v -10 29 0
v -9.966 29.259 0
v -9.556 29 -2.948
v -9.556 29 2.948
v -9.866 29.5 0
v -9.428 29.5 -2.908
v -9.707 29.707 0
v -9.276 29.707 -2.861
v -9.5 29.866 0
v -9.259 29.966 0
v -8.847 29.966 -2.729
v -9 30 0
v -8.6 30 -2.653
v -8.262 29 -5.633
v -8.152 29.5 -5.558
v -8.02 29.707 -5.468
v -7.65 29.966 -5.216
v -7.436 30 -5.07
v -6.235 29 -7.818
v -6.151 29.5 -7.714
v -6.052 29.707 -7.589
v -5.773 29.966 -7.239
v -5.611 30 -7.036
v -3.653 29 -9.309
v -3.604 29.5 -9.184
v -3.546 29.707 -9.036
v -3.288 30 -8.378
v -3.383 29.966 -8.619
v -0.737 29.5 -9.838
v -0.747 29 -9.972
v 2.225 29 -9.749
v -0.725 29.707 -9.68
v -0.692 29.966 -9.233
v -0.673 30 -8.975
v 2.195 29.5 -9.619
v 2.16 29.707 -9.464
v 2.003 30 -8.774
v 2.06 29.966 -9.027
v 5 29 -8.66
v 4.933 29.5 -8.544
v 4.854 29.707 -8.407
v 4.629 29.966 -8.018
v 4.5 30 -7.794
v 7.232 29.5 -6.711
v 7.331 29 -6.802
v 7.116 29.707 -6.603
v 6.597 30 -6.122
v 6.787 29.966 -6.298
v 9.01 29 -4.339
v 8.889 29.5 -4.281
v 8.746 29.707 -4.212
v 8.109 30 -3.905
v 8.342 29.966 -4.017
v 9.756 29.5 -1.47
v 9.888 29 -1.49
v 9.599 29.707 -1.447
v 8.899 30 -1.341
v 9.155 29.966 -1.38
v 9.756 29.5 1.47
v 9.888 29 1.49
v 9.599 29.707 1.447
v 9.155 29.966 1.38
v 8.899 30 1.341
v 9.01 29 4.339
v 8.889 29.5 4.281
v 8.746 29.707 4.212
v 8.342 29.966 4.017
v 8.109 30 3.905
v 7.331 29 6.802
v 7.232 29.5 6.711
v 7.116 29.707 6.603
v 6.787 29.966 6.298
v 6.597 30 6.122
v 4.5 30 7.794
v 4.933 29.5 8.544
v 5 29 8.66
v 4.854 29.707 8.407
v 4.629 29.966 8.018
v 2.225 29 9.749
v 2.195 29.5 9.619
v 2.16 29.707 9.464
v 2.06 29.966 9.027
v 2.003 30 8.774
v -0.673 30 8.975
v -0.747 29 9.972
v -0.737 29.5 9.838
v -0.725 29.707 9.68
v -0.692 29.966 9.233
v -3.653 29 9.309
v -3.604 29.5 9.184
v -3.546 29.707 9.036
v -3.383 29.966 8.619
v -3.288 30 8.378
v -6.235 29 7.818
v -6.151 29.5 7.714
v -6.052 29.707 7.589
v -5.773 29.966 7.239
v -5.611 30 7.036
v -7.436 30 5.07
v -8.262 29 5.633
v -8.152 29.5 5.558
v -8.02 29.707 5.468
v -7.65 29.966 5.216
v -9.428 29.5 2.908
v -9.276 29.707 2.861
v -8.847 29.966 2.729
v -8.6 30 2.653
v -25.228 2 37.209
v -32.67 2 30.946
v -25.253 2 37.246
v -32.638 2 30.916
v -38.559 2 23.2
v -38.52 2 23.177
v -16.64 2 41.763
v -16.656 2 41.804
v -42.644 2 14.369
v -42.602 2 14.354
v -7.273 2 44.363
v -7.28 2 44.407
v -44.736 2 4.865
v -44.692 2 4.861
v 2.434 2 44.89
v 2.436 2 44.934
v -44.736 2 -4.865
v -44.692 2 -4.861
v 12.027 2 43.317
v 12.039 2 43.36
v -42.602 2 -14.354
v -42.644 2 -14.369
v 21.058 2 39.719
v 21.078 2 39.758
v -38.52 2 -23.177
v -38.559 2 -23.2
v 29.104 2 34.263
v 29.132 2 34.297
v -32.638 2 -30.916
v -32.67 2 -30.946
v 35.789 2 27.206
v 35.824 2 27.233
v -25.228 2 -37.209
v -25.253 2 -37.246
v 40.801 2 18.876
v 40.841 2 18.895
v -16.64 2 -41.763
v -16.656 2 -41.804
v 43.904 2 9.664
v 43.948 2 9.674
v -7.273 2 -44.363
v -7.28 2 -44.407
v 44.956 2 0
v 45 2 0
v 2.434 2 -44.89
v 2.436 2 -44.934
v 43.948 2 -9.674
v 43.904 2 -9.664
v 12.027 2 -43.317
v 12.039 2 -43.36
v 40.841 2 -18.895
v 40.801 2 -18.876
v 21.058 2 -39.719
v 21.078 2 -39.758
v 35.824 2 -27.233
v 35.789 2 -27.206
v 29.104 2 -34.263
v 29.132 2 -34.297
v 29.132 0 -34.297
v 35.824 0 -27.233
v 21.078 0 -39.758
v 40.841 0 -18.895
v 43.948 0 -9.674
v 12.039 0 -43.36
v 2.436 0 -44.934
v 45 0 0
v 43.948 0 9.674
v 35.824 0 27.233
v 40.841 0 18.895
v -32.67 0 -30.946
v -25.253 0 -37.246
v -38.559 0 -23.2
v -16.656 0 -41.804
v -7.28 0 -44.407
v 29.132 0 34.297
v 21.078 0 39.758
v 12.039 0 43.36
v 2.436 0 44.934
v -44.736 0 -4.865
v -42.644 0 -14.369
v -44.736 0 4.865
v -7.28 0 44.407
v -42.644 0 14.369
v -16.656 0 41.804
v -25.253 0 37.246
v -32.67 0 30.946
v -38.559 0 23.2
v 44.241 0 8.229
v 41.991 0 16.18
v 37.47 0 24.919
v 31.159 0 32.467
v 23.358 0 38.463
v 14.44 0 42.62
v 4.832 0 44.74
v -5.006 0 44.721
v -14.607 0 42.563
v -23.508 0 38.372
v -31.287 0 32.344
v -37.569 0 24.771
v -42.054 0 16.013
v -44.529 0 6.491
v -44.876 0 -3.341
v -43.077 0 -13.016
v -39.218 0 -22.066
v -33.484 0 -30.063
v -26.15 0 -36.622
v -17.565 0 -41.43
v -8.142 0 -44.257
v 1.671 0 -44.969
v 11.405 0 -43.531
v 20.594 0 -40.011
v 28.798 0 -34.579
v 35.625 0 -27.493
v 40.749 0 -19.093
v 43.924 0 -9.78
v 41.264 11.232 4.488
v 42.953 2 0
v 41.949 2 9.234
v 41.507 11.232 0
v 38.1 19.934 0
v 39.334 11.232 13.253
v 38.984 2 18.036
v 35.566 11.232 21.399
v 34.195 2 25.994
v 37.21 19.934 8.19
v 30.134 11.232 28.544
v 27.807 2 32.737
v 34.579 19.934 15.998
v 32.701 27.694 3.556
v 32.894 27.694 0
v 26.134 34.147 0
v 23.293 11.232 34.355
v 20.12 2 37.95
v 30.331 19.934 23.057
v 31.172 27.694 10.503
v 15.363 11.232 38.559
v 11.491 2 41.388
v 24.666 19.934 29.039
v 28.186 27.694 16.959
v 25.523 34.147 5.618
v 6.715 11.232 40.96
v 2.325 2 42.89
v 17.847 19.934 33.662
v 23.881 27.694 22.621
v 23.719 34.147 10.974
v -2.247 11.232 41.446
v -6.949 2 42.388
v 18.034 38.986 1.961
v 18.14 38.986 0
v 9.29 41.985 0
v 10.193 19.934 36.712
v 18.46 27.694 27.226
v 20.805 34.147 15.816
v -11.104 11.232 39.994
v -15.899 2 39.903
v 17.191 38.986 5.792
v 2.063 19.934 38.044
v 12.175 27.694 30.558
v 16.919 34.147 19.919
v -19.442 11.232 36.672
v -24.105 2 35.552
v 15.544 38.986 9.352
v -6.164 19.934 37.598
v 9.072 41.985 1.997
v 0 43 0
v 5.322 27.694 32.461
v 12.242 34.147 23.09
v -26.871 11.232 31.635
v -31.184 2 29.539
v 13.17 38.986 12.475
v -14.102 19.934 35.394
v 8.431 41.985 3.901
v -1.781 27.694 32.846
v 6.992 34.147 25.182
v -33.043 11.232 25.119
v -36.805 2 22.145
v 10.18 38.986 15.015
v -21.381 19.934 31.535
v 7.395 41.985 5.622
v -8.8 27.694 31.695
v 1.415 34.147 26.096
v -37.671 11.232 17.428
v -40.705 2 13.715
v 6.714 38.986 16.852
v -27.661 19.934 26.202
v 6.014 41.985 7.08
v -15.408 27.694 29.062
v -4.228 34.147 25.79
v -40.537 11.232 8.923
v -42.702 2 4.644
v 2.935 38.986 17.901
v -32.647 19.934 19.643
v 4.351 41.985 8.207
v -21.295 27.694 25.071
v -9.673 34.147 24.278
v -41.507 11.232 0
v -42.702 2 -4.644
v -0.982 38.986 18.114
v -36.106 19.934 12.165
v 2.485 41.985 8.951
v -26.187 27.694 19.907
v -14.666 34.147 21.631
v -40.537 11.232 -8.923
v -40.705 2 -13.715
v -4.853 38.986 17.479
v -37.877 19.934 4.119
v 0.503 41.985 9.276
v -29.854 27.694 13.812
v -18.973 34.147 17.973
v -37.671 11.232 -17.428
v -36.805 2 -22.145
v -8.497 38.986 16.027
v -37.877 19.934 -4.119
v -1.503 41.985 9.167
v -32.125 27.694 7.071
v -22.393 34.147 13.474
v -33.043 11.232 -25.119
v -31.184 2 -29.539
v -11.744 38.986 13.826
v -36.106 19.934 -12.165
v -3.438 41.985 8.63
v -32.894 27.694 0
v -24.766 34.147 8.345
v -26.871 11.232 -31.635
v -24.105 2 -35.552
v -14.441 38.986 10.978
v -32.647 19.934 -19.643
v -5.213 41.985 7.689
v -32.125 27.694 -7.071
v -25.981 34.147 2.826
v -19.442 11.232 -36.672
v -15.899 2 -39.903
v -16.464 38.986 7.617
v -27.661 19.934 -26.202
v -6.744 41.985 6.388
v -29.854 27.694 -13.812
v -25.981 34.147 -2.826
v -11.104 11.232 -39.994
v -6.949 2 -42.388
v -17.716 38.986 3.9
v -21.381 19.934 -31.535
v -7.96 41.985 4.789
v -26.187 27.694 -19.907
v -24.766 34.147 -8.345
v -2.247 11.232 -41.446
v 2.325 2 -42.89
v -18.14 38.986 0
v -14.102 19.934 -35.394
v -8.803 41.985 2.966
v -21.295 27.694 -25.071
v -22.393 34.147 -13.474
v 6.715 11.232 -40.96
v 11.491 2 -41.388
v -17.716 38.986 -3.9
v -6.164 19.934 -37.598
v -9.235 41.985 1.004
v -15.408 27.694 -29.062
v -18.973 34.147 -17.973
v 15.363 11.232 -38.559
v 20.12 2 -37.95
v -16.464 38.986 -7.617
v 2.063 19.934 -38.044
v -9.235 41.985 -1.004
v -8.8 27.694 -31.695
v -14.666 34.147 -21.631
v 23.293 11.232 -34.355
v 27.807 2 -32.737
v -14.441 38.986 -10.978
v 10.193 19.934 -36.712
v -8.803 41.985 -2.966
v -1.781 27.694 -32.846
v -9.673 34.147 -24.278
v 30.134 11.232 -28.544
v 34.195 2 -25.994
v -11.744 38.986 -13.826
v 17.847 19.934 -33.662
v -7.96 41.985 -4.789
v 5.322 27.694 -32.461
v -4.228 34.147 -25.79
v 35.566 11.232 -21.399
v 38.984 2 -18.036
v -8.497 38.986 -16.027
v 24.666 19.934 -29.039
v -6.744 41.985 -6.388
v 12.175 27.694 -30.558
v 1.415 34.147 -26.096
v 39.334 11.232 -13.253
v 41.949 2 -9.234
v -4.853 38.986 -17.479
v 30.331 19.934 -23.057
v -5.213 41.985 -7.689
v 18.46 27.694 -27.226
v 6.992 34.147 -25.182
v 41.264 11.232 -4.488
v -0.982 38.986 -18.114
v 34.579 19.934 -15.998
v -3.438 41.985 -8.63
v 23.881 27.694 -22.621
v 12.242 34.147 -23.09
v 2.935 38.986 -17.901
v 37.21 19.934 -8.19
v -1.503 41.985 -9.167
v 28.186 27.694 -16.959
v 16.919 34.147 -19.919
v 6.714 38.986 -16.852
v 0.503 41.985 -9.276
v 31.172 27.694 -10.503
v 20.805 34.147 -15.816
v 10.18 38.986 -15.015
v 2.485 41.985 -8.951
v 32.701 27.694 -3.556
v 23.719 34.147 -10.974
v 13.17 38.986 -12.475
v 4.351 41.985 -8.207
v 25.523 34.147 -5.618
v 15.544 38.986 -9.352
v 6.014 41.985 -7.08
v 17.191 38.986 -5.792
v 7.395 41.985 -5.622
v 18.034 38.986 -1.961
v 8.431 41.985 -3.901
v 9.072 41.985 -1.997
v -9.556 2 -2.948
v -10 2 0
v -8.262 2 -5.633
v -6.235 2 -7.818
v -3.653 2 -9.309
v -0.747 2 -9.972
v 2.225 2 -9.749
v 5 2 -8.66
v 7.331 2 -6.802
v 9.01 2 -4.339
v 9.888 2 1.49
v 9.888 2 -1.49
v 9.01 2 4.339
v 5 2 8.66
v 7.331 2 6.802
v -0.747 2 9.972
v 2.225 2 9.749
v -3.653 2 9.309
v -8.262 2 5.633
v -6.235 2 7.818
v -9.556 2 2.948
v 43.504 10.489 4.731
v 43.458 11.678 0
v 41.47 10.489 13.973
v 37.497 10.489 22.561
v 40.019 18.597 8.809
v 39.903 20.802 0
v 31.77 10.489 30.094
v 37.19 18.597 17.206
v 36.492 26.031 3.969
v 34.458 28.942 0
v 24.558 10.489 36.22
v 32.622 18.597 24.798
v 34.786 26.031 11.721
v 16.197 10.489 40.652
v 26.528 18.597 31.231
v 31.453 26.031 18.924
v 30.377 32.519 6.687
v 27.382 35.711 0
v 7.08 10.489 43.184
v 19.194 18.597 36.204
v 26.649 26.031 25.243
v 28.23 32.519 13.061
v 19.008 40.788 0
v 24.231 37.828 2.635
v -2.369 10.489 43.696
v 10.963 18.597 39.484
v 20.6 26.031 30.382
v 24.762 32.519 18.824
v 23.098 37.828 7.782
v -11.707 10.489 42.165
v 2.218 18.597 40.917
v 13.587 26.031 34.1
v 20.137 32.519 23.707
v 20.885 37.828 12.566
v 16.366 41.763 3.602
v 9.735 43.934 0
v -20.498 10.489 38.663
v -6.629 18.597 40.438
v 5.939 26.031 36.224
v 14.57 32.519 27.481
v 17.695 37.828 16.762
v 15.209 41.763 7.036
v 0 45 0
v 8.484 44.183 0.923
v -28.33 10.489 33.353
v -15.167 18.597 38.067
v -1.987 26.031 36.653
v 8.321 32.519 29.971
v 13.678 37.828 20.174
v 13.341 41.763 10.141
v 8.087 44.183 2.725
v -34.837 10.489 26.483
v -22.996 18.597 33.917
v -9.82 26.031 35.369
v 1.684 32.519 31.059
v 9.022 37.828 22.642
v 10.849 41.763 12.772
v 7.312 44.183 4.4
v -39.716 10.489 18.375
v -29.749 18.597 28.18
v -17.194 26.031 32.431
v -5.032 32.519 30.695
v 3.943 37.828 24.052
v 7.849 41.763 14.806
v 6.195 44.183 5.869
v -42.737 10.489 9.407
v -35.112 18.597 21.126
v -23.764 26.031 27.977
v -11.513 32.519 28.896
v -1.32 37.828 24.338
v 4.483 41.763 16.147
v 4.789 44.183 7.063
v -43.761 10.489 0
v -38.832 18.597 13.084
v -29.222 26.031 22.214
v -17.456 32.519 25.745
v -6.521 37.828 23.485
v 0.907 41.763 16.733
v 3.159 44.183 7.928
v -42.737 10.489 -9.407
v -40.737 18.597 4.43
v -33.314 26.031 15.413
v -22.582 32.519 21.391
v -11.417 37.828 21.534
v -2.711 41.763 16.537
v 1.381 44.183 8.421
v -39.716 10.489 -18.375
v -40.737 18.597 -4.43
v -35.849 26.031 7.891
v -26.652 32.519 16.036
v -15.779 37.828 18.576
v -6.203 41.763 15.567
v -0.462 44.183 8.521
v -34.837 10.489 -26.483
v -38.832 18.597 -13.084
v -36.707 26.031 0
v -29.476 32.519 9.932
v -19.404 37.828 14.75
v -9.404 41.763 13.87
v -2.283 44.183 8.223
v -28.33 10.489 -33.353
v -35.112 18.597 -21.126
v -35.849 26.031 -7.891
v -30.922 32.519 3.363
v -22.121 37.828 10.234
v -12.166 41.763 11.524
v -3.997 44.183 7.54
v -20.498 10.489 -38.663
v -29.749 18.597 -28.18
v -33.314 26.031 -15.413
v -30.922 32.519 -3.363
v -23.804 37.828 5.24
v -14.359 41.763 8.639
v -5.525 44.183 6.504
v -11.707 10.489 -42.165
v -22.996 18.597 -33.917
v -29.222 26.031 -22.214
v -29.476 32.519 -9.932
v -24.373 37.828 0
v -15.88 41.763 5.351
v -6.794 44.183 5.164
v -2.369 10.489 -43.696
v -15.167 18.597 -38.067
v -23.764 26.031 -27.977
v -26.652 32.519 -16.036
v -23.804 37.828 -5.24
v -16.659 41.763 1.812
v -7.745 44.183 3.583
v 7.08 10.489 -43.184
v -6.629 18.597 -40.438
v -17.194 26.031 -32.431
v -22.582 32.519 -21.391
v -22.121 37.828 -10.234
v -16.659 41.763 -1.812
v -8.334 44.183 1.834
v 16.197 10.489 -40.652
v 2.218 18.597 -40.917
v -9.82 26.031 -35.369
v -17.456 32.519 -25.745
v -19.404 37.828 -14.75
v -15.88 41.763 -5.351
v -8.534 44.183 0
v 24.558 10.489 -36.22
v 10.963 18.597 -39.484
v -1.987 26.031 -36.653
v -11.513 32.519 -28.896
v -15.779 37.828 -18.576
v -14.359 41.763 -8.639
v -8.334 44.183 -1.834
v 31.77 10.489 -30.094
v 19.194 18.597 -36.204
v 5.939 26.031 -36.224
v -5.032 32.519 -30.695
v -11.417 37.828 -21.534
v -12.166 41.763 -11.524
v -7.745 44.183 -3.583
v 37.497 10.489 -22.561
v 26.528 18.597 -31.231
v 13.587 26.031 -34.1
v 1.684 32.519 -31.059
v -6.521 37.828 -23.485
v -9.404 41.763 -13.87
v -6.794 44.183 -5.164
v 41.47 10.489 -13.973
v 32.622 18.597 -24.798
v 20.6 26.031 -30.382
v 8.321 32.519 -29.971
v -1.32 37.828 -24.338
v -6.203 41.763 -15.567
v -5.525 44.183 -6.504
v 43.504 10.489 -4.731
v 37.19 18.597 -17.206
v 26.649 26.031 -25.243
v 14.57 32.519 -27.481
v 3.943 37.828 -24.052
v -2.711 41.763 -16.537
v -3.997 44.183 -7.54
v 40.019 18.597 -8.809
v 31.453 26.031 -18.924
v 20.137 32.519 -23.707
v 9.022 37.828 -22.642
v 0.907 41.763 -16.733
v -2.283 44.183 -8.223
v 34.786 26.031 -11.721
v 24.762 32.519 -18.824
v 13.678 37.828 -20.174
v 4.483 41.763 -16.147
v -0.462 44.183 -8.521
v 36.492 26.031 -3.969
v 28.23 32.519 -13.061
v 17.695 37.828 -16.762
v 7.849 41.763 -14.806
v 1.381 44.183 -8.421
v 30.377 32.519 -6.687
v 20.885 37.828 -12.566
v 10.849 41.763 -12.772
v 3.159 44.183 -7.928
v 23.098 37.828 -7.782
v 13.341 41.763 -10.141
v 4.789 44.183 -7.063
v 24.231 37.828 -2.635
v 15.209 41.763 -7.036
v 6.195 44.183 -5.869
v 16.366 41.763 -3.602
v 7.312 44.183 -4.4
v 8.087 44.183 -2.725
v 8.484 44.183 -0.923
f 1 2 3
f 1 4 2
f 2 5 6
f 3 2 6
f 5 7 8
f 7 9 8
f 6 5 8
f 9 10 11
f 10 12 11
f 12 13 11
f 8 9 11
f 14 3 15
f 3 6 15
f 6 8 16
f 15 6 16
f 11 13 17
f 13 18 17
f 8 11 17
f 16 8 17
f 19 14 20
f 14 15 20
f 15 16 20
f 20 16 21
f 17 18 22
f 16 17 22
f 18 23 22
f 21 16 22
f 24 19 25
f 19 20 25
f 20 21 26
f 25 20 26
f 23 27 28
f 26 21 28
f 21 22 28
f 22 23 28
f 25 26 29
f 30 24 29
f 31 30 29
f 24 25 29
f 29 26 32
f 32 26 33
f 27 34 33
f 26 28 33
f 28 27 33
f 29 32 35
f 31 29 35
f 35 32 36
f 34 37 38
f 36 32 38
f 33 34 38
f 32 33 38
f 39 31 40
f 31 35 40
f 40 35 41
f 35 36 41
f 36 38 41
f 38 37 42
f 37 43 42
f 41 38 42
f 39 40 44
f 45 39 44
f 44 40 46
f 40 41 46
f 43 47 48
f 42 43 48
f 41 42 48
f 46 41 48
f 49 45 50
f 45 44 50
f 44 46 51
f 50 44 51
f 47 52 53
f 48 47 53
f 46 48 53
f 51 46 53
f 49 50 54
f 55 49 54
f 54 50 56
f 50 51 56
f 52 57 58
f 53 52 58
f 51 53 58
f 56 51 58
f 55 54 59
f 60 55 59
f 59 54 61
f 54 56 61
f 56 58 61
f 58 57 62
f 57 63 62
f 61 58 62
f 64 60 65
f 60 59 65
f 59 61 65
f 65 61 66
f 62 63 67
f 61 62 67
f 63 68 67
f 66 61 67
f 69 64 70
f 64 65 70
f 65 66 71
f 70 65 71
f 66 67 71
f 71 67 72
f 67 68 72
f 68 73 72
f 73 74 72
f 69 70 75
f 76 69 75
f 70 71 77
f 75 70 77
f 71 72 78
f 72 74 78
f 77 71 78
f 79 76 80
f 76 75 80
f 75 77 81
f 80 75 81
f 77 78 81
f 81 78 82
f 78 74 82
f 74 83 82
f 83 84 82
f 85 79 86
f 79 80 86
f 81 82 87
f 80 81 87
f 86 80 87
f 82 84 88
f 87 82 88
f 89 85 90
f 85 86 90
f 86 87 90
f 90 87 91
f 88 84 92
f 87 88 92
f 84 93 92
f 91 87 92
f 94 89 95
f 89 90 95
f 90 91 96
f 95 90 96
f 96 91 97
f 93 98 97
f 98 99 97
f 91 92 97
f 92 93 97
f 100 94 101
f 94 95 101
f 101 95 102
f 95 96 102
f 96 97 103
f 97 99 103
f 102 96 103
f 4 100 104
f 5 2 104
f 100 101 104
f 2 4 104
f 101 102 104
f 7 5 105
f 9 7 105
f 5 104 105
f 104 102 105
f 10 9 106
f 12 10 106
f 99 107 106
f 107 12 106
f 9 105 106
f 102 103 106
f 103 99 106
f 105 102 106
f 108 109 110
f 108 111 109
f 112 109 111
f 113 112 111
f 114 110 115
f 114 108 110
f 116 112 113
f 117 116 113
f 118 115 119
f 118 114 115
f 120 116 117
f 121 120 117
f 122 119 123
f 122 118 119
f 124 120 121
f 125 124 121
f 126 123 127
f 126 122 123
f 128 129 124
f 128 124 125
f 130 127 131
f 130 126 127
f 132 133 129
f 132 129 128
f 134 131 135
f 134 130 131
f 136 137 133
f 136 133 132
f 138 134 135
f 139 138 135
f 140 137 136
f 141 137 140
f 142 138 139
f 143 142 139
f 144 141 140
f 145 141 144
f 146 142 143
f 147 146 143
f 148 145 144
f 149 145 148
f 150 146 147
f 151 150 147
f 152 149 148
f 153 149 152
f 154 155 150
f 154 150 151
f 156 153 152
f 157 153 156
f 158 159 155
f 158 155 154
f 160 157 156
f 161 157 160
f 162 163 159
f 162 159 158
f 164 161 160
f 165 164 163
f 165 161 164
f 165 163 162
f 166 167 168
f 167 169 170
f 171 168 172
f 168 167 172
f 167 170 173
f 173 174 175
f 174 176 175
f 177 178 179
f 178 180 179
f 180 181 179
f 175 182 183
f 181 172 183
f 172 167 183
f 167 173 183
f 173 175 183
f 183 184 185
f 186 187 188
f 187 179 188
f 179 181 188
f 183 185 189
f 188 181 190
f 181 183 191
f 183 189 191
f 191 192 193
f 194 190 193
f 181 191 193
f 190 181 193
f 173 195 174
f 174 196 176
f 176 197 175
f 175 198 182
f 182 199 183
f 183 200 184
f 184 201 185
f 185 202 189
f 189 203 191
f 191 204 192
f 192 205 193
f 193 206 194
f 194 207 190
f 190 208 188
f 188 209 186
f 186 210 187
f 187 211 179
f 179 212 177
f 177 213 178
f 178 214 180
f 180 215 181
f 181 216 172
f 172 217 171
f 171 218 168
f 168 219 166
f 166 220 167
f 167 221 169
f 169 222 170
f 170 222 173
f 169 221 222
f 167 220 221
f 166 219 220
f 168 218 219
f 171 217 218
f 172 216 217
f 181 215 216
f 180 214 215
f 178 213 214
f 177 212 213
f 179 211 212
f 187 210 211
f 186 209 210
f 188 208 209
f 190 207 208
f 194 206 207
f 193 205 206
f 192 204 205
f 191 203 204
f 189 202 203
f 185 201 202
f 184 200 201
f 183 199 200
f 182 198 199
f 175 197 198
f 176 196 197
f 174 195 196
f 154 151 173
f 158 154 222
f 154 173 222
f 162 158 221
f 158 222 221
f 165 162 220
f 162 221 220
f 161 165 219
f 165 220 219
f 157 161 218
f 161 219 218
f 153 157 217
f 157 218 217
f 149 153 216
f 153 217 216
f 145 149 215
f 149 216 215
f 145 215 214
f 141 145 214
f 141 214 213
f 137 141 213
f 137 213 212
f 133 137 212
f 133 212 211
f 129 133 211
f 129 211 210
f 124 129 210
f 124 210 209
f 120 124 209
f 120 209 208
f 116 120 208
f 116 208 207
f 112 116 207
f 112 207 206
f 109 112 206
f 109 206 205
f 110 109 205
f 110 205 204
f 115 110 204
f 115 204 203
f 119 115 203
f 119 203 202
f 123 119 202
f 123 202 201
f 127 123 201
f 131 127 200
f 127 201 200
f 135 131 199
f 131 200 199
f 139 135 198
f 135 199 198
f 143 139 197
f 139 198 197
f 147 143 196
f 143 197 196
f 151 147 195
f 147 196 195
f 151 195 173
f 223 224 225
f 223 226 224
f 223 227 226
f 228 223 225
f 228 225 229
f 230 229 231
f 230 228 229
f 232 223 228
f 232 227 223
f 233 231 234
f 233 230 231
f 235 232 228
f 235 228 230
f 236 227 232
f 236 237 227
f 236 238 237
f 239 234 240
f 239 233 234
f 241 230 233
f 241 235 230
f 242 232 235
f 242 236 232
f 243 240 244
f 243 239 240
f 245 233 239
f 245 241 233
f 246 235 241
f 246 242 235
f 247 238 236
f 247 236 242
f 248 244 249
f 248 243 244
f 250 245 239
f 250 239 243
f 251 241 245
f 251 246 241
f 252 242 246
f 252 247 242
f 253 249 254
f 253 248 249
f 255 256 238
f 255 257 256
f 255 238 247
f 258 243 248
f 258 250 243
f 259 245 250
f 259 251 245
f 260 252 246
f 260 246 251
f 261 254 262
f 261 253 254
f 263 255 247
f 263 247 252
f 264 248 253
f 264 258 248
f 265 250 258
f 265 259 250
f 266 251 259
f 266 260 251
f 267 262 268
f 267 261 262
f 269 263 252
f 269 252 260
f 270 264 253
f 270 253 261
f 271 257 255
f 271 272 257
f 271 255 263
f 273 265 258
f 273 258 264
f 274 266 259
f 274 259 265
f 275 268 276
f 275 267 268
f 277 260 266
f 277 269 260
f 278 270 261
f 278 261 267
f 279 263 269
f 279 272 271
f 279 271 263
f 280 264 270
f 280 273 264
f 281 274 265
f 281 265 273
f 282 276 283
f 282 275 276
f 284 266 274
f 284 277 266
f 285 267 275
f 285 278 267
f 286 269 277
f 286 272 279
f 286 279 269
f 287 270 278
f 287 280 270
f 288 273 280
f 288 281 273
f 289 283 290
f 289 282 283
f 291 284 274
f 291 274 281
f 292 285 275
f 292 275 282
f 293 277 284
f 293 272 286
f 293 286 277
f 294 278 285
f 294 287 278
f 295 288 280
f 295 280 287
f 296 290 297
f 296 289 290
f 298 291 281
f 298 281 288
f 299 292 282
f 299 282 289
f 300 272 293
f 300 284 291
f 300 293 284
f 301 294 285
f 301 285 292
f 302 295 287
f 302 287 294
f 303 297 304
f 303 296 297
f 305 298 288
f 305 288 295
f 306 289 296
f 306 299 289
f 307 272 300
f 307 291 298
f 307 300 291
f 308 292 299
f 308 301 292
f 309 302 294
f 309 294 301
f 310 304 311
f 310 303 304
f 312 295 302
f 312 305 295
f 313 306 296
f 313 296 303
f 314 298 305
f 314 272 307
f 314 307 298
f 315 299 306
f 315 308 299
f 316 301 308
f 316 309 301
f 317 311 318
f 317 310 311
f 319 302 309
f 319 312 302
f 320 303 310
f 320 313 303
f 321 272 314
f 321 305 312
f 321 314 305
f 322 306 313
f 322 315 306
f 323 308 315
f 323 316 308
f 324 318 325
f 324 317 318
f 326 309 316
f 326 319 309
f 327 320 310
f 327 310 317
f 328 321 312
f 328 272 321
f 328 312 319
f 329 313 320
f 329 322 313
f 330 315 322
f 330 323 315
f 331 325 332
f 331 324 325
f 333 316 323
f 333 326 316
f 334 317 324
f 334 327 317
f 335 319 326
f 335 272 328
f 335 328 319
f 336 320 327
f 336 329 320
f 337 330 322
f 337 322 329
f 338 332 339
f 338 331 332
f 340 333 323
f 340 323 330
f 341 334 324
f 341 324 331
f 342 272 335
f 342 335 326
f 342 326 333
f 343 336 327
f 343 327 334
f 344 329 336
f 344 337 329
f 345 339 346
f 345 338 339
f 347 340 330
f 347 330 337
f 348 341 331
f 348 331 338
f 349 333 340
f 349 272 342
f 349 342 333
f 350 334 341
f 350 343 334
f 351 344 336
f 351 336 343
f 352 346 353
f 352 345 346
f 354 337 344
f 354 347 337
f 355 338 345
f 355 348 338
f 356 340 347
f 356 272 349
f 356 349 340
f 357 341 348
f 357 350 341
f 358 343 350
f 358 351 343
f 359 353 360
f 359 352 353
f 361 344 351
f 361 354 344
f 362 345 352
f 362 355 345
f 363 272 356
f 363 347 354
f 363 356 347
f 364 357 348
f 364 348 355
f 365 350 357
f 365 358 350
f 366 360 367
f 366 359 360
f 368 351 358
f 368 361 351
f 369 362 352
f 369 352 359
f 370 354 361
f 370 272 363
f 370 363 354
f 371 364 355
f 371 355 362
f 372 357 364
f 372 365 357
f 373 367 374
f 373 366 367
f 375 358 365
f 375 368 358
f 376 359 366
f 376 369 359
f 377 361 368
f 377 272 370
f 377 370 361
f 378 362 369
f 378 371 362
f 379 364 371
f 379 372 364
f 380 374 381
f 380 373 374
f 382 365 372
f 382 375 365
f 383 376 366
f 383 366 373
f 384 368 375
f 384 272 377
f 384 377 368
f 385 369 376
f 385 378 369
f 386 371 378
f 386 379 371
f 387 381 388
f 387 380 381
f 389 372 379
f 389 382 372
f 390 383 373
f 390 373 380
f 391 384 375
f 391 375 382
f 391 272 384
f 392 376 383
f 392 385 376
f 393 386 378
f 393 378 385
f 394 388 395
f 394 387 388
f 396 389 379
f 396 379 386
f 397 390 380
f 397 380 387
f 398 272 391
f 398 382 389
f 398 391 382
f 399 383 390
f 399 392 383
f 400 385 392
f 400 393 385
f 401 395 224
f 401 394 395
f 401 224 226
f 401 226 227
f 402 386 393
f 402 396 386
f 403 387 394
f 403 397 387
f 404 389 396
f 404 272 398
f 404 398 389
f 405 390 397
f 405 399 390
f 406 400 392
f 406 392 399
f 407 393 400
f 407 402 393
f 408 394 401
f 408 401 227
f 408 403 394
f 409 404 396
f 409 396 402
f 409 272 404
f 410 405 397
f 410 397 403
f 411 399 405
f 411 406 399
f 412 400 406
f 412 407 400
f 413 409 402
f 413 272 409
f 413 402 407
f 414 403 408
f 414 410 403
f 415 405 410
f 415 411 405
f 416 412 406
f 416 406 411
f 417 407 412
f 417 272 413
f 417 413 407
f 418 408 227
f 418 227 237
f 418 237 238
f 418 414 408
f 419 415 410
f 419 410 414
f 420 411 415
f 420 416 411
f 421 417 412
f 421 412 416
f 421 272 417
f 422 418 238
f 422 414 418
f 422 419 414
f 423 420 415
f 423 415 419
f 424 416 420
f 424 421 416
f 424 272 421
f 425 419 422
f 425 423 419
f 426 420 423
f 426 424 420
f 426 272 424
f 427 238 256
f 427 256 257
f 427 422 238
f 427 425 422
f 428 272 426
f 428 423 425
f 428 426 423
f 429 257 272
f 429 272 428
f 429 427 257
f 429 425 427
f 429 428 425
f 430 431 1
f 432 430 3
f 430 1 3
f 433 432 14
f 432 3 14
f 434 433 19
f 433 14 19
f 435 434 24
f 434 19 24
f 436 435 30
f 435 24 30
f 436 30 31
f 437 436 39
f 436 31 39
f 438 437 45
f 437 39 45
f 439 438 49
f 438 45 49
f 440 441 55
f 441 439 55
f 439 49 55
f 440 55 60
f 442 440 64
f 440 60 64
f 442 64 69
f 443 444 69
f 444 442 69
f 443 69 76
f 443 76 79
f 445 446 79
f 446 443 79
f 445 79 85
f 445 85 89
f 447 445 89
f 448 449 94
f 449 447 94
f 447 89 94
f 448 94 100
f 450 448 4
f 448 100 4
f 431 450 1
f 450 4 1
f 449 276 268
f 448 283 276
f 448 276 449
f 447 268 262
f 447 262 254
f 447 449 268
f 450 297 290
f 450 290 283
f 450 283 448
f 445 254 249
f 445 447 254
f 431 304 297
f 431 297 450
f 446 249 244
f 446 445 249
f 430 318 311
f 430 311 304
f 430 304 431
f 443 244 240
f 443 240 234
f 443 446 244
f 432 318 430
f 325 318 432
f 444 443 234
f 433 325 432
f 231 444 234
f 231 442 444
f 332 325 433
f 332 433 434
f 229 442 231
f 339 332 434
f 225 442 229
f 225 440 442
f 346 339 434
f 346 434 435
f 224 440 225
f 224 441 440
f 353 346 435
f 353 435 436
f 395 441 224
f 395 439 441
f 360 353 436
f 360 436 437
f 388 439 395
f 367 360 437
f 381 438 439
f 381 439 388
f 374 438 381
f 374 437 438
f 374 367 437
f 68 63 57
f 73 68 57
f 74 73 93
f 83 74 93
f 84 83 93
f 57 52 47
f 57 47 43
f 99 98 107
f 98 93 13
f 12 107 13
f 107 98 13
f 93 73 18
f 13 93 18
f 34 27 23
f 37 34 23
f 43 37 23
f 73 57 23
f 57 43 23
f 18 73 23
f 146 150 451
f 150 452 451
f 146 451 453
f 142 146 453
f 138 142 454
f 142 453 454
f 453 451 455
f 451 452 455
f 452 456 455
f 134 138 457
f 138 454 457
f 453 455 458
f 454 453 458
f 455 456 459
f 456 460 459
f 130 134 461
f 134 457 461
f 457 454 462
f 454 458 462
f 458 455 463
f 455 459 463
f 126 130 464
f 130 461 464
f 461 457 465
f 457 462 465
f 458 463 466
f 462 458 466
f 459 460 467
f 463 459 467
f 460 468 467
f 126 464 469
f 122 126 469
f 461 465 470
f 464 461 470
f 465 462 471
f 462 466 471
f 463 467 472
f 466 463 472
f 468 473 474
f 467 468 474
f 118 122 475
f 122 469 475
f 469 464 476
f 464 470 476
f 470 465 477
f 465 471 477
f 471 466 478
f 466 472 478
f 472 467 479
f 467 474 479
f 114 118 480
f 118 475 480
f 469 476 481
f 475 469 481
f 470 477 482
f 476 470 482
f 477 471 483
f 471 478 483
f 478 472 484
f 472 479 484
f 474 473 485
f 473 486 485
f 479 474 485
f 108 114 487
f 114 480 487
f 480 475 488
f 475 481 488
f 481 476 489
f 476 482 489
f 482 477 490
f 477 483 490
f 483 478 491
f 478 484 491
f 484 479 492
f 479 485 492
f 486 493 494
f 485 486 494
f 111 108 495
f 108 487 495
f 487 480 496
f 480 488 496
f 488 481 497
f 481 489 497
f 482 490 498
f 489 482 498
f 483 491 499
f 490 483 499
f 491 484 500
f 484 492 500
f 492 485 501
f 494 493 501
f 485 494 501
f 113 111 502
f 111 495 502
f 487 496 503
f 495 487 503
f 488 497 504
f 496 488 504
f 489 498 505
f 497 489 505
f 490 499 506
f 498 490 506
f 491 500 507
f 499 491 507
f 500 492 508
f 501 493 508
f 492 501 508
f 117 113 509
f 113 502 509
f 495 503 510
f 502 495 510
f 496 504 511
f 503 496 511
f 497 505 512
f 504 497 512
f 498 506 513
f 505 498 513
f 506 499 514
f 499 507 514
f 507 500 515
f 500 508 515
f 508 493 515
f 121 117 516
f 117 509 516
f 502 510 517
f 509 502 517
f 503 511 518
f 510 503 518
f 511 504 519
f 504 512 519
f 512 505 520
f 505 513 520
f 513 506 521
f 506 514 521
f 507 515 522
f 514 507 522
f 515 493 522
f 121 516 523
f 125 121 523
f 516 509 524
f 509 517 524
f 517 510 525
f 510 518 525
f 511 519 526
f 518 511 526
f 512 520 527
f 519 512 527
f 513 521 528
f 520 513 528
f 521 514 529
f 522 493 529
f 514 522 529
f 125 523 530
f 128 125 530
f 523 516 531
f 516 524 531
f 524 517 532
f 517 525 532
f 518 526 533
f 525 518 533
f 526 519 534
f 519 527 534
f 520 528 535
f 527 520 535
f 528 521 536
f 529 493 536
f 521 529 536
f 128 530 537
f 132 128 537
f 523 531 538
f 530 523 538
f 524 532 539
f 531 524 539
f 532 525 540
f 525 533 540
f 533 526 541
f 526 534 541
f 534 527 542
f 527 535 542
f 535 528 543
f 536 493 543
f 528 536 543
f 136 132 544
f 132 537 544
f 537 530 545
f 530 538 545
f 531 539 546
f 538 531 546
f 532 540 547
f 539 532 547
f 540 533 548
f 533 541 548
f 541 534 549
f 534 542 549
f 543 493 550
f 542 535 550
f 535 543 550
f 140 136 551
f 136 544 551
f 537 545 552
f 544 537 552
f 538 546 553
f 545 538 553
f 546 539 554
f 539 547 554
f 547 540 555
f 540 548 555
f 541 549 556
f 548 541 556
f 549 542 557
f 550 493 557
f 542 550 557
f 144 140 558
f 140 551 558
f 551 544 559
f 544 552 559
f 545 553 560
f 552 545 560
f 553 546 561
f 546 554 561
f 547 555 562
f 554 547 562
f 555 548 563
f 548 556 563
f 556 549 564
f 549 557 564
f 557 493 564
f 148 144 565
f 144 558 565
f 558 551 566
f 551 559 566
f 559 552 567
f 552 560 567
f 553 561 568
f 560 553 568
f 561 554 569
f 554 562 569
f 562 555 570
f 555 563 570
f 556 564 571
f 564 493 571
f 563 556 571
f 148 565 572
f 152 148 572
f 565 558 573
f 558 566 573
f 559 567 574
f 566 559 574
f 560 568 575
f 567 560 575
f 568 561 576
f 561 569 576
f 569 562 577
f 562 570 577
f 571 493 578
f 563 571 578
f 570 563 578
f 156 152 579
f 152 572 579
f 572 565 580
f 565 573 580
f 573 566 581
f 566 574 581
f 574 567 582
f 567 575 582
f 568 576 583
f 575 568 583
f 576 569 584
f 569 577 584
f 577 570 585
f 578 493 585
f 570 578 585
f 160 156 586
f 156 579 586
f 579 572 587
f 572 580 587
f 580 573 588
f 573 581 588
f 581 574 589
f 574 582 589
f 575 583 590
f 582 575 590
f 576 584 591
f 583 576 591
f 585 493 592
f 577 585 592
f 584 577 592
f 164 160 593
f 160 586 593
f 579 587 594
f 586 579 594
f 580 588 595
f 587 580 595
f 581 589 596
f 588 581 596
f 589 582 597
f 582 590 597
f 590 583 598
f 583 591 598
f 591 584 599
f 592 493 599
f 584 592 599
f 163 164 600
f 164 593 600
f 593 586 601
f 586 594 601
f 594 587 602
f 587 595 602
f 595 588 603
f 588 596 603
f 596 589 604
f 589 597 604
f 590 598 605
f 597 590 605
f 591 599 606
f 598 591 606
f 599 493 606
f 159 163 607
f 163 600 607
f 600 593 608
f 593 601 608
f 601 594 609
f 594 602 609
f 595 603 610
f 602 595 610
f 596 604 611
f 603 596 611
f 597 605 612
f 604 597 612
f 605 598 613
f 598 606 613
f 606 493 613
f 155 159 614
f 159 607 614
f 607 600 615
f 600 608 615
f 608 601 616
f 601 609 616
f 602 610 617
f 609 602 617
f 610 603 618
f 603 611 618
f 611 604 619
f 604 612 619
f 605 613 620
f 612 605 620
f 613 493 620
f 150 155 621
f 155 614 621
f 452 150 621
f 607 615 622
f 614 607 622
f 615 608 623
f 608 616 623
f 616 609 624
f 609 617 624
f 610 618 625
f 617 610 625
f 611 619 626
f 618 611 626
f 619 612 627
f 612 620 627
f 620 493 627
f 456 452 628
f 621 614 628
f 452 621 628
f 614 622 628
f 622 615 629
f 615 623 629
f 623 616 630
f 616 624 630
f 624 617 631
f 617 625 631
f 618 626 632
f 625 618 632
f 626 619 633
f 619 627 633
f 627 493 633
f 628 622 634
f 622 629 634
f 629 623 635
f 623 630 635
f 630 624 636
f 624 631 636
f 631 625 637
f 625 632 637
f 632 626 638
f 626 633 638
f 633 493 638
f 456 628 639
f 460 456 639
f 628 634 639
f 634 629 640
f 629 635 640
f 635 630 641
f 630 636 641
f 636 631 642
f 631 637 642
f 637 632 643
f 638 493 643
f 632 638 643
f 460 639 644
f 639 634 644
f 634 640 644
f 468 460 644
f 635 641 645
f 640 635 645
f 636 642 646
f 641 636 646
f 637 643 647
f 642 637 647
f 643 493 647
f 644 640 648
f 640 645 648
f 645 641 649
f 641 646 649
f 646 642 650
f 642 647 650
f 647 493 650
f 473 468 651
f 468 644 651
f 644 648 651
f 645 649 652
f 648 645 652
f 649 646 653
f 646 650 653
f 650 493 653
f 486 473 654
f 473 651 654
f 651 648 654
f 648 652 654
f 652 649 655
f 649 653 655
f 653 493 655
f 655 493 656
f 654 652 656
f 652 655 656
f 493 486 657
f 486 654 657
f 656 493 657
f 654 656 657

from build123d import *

# Parameters (mm, degrees)
SHELL1_T            = -2
SKETCH3_W           = 10
SKETCH3_H           = 30
FILLET1_R           = 1
SKETCH2_R           = 45
BOSS_EXTRUDE2_DEPTH = 2


with BuildPart() as part:
    # Sketch1 → Revolve1 (revolve)
    with BuildSketch(Plane.XY):
        with BuildLine():
            Line((0, 45), (0, 0))
            Line((0, 0), (45, 0))
            ThreePointArc((45, 0), (31.819805153, 31.819805153), (0, 45))
        make_face()
    revolve(axis=Axis((0, 45, 0), (0, -1, 0)))

    # Shell1
    shell1_openings = [part.faces().sort_by_distance(p)[0] for p in [
        (0, 0, 45),
    ]]
    offset(amount=SHELL1_T, openings=shell1_openings, kind=Kind.INTERSECTION)



with BuildPart() as body_2:
    # Sketch3 → Revolve2 (revolve)
    with BuildSketch(Plane.XY):
        with Locations((-5, 15)):
            Rectangle(SKETCH3_W, SKETCH3_H)
    revolve(axis=Axis((0, 30, 0), (0, -1, 0)))

    # Fillet1
    fillet1_edges = [body_2.edges().sort_by_distance(p)[0] for p in [
        (10, 30, 0),
    ]]
    fillet(fillet1_edges, radius=FILLET1_R)


with BuildPart() as part_1:
    add(part.part)

    add(body_2.part)  # Boss-Extrude2 merges body 2
    # Sketch2 → Boss-Extrude2 (add)
    with BuildSketch(Plane(origin=(0, 0, 0), x_dir=(1, 0, 0), z_dir=(0, 1, 0))):
        Circle(SKETCH2_R)
    extrude(amount=BOSS_EXTRUDE2_DEPTH)


solid = part_1.part
